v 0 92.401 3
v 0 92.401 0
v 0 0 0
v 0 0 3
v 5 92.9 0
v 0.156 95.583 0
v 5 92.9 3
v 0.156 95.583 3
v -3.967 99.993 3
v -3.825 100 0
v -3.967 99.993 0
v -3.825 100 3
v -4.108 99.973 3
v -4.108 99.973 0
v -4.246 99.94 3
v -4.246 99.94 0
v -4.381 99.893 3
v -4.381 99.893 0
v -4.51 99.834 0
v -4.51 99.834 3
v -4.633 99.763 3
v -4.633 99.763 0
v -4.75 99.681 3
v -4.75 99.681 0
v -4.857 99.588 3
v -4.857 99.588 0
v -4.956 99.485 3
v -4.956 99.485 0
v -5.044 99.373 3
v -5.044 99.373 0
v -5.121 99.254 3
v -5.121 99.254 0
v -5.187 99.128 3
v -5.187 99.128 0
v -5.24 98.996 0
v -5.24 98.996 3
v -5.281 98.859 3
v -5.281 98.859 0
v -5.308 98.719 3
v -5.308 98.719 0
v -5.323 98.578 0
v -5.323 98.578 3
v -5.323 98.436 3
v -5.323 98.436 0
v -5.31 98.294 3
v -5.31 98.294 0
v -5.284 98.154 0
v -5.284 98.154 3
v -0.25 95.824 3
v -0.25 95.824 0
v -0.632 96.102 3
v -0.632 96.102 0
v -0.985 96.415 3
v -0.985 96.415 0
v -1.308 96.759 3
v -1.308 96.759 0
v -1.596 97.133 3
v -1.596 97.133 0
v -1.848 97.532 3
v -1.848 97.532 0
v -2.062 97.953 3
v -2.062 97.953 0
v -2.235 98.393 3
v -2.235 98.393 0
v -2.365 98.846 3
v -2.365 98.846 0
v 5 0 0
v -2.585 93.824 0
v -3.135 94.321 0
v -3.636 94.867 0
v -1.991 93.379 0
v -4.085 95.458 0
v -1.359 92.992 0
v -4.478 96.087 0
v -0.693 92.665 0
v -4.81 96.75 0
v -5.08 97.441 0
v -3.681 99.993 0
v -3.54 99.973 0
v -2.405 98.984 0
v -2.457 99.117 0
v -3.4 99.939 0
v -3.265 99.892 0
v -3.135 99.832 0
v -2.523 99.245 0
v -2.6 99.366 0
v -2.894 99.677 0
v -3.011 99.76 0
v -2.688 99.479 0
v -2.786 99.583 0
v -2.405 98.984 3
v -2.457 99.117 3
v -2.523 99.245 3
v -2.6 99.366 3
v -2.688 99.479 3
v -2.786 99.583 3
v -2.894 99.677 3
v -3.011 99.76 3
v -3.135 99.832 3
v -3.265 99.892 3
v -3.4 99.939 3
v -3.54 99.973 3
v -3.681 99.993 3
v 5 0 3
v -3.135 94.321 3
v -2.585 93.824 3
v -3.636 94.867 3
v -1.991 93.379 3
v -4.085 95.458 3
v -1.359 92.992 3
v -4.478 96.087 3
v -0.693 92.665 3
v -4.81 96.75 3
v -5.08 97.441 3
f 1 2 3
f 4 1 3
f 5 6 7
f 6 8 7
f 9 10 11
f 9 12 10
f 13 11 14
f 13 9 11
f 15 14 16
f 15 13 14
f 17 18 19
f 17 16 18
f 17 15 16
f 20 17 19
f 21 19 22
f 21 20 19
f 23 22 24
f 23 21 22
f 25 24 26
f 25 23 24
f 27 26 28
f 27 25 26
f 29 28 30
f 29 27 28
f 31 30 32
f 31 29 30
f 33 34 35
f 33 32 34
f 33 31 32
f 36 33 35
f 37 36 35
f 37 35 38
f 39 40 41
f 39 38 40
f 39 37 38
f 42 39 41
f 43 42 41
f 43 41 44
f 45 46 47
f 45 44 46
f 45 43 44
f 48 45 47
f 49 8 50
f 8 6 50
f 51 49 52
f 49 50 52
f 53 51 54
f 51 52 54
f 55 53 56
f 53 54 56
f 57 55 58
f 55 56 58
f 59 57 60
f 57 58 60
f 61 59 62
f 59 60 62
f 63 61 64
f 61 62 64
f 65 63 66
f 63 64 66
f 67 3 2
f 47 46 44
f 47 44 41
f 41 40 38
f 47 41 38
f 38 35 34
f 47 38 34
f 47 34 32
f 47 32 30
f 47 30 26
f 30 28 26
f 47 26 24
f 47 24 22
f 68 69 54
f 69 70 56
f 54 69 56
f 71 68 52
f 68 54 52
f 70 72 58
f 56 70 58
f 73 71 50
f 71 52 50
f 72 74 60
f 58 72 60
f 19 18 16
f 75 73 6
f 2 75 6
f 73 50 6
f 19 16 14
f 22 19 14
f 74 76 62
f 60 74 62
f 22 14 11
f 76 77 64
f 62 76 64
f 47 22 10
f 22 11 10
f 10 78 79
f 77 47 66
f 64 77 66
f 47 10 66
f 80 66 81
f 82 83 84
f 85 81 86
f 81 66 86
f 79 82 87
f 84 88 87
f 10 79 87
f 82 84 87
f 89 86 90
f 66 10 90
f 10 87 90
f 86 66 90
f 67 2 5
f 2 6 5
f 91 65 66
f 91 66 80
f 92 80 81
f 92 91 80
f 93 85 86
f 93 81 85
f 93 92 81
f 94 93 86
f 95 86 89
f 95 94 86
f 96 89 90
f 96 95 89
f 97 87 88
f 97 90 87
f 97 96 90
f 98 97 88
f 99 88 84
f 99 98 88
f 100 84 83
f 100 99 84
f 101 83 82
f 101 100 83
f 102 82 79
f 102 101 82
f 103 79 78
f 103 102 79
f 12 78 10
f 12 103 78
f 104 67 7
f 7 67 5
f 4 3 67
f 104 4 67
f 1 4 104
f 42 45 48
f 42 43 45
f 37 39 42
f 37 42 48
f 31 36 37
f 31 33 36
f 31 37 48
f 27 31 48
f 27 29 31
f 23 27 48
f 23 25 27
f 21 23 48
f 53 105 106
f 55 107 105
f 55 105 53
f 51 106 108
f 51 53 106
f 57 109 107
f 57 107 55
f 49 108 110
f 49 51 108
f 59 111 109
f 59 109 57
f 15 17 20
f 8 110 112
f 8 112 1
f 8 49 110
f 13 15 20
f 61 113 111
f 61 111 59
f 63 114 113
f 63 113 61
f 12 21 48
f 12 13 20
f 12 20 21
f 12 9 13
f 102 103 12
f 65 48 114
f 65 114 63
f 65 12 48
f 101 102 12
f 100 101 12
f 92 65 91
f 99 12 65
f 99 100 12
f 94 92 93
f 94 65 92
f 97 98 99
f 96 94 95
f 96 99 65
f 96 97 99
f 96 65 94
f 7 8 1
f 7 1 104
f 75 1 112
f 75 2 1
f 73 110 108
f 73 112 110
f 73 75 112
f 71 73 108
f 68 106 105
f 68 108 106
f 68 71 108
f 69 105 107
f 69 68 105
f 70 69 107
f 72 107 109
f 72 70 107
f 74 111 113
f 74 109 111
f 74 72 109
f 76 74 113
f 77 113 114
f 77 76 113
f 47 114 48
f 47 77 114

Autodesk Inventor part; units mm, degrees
ref_plane "YZ Plane" through (0, 0, 0) normal (1, 0, 0) x (0, 1, 0)
ref_plane "XZ Plane" through (0, 0, 0) normal (0, 1, 0) x (-1, 0, 0)
ref_plane "XY Plane" through (0, 0, 0) normal (0, 0, 1) x (1, 0, 0)
sketch "Sketch1" plane through (0, 0, 0) normal (0, 0, 1) x (1, 0, 0)
  line L0 (0, 0) -> (5, 0)
  line L1 (5, 0) -> (5, 95)
  line L2 (5, 95) -> (2.5, 95)
  line L3 (0, 92.4007) -> (0, 0)
  arc A0 (-2.5, 100) -> (2.5, 95) centre (2.5, 100) ccw
  arc A1 (-5.5, 100) -> (0, 92.4007) centre (2.5, 100) ccw
  line L4 (-5.5, 100) -> (-2.5, 100)
  point P0 (2.5, 0)
  dimension "d1" = 95
  dimension "d5" = 10
  dimension "d6" = 3
  dimension "d7" = 3
  dimension "d8" = 5
extrude "Extrusion1" add sketch "Sketch1" along normal blind 3
fillet "Fillet2" radius 1.5 2 edges at (-2.5, 100, 1.5) (-5.5, 100, 1.5)
sketch "Sketch3" plane through (0, 0, 3) normal (0, 0, 1) x (1, 0, 0)
  line L0 (0, 95.6699) -> (5, 92.9)
  line L1 (5, 92.9) -> (5, 95)
  line L2 (5, 95) -> (0, 95.6699)
  arc A0 (-2.365, 98.8462) -> (2.5, 95) centre (2.5, 100) ccw projected
  point P0 (0, 0)
  point P1 (0, 92.4007)
  dimension "d12" = 5
  dimension "d14" = 2.1
extrude "Extrusion2" cut sketch "Sketch3" against normal through all
properties part number "Moving Ramp Holder Shaft"
